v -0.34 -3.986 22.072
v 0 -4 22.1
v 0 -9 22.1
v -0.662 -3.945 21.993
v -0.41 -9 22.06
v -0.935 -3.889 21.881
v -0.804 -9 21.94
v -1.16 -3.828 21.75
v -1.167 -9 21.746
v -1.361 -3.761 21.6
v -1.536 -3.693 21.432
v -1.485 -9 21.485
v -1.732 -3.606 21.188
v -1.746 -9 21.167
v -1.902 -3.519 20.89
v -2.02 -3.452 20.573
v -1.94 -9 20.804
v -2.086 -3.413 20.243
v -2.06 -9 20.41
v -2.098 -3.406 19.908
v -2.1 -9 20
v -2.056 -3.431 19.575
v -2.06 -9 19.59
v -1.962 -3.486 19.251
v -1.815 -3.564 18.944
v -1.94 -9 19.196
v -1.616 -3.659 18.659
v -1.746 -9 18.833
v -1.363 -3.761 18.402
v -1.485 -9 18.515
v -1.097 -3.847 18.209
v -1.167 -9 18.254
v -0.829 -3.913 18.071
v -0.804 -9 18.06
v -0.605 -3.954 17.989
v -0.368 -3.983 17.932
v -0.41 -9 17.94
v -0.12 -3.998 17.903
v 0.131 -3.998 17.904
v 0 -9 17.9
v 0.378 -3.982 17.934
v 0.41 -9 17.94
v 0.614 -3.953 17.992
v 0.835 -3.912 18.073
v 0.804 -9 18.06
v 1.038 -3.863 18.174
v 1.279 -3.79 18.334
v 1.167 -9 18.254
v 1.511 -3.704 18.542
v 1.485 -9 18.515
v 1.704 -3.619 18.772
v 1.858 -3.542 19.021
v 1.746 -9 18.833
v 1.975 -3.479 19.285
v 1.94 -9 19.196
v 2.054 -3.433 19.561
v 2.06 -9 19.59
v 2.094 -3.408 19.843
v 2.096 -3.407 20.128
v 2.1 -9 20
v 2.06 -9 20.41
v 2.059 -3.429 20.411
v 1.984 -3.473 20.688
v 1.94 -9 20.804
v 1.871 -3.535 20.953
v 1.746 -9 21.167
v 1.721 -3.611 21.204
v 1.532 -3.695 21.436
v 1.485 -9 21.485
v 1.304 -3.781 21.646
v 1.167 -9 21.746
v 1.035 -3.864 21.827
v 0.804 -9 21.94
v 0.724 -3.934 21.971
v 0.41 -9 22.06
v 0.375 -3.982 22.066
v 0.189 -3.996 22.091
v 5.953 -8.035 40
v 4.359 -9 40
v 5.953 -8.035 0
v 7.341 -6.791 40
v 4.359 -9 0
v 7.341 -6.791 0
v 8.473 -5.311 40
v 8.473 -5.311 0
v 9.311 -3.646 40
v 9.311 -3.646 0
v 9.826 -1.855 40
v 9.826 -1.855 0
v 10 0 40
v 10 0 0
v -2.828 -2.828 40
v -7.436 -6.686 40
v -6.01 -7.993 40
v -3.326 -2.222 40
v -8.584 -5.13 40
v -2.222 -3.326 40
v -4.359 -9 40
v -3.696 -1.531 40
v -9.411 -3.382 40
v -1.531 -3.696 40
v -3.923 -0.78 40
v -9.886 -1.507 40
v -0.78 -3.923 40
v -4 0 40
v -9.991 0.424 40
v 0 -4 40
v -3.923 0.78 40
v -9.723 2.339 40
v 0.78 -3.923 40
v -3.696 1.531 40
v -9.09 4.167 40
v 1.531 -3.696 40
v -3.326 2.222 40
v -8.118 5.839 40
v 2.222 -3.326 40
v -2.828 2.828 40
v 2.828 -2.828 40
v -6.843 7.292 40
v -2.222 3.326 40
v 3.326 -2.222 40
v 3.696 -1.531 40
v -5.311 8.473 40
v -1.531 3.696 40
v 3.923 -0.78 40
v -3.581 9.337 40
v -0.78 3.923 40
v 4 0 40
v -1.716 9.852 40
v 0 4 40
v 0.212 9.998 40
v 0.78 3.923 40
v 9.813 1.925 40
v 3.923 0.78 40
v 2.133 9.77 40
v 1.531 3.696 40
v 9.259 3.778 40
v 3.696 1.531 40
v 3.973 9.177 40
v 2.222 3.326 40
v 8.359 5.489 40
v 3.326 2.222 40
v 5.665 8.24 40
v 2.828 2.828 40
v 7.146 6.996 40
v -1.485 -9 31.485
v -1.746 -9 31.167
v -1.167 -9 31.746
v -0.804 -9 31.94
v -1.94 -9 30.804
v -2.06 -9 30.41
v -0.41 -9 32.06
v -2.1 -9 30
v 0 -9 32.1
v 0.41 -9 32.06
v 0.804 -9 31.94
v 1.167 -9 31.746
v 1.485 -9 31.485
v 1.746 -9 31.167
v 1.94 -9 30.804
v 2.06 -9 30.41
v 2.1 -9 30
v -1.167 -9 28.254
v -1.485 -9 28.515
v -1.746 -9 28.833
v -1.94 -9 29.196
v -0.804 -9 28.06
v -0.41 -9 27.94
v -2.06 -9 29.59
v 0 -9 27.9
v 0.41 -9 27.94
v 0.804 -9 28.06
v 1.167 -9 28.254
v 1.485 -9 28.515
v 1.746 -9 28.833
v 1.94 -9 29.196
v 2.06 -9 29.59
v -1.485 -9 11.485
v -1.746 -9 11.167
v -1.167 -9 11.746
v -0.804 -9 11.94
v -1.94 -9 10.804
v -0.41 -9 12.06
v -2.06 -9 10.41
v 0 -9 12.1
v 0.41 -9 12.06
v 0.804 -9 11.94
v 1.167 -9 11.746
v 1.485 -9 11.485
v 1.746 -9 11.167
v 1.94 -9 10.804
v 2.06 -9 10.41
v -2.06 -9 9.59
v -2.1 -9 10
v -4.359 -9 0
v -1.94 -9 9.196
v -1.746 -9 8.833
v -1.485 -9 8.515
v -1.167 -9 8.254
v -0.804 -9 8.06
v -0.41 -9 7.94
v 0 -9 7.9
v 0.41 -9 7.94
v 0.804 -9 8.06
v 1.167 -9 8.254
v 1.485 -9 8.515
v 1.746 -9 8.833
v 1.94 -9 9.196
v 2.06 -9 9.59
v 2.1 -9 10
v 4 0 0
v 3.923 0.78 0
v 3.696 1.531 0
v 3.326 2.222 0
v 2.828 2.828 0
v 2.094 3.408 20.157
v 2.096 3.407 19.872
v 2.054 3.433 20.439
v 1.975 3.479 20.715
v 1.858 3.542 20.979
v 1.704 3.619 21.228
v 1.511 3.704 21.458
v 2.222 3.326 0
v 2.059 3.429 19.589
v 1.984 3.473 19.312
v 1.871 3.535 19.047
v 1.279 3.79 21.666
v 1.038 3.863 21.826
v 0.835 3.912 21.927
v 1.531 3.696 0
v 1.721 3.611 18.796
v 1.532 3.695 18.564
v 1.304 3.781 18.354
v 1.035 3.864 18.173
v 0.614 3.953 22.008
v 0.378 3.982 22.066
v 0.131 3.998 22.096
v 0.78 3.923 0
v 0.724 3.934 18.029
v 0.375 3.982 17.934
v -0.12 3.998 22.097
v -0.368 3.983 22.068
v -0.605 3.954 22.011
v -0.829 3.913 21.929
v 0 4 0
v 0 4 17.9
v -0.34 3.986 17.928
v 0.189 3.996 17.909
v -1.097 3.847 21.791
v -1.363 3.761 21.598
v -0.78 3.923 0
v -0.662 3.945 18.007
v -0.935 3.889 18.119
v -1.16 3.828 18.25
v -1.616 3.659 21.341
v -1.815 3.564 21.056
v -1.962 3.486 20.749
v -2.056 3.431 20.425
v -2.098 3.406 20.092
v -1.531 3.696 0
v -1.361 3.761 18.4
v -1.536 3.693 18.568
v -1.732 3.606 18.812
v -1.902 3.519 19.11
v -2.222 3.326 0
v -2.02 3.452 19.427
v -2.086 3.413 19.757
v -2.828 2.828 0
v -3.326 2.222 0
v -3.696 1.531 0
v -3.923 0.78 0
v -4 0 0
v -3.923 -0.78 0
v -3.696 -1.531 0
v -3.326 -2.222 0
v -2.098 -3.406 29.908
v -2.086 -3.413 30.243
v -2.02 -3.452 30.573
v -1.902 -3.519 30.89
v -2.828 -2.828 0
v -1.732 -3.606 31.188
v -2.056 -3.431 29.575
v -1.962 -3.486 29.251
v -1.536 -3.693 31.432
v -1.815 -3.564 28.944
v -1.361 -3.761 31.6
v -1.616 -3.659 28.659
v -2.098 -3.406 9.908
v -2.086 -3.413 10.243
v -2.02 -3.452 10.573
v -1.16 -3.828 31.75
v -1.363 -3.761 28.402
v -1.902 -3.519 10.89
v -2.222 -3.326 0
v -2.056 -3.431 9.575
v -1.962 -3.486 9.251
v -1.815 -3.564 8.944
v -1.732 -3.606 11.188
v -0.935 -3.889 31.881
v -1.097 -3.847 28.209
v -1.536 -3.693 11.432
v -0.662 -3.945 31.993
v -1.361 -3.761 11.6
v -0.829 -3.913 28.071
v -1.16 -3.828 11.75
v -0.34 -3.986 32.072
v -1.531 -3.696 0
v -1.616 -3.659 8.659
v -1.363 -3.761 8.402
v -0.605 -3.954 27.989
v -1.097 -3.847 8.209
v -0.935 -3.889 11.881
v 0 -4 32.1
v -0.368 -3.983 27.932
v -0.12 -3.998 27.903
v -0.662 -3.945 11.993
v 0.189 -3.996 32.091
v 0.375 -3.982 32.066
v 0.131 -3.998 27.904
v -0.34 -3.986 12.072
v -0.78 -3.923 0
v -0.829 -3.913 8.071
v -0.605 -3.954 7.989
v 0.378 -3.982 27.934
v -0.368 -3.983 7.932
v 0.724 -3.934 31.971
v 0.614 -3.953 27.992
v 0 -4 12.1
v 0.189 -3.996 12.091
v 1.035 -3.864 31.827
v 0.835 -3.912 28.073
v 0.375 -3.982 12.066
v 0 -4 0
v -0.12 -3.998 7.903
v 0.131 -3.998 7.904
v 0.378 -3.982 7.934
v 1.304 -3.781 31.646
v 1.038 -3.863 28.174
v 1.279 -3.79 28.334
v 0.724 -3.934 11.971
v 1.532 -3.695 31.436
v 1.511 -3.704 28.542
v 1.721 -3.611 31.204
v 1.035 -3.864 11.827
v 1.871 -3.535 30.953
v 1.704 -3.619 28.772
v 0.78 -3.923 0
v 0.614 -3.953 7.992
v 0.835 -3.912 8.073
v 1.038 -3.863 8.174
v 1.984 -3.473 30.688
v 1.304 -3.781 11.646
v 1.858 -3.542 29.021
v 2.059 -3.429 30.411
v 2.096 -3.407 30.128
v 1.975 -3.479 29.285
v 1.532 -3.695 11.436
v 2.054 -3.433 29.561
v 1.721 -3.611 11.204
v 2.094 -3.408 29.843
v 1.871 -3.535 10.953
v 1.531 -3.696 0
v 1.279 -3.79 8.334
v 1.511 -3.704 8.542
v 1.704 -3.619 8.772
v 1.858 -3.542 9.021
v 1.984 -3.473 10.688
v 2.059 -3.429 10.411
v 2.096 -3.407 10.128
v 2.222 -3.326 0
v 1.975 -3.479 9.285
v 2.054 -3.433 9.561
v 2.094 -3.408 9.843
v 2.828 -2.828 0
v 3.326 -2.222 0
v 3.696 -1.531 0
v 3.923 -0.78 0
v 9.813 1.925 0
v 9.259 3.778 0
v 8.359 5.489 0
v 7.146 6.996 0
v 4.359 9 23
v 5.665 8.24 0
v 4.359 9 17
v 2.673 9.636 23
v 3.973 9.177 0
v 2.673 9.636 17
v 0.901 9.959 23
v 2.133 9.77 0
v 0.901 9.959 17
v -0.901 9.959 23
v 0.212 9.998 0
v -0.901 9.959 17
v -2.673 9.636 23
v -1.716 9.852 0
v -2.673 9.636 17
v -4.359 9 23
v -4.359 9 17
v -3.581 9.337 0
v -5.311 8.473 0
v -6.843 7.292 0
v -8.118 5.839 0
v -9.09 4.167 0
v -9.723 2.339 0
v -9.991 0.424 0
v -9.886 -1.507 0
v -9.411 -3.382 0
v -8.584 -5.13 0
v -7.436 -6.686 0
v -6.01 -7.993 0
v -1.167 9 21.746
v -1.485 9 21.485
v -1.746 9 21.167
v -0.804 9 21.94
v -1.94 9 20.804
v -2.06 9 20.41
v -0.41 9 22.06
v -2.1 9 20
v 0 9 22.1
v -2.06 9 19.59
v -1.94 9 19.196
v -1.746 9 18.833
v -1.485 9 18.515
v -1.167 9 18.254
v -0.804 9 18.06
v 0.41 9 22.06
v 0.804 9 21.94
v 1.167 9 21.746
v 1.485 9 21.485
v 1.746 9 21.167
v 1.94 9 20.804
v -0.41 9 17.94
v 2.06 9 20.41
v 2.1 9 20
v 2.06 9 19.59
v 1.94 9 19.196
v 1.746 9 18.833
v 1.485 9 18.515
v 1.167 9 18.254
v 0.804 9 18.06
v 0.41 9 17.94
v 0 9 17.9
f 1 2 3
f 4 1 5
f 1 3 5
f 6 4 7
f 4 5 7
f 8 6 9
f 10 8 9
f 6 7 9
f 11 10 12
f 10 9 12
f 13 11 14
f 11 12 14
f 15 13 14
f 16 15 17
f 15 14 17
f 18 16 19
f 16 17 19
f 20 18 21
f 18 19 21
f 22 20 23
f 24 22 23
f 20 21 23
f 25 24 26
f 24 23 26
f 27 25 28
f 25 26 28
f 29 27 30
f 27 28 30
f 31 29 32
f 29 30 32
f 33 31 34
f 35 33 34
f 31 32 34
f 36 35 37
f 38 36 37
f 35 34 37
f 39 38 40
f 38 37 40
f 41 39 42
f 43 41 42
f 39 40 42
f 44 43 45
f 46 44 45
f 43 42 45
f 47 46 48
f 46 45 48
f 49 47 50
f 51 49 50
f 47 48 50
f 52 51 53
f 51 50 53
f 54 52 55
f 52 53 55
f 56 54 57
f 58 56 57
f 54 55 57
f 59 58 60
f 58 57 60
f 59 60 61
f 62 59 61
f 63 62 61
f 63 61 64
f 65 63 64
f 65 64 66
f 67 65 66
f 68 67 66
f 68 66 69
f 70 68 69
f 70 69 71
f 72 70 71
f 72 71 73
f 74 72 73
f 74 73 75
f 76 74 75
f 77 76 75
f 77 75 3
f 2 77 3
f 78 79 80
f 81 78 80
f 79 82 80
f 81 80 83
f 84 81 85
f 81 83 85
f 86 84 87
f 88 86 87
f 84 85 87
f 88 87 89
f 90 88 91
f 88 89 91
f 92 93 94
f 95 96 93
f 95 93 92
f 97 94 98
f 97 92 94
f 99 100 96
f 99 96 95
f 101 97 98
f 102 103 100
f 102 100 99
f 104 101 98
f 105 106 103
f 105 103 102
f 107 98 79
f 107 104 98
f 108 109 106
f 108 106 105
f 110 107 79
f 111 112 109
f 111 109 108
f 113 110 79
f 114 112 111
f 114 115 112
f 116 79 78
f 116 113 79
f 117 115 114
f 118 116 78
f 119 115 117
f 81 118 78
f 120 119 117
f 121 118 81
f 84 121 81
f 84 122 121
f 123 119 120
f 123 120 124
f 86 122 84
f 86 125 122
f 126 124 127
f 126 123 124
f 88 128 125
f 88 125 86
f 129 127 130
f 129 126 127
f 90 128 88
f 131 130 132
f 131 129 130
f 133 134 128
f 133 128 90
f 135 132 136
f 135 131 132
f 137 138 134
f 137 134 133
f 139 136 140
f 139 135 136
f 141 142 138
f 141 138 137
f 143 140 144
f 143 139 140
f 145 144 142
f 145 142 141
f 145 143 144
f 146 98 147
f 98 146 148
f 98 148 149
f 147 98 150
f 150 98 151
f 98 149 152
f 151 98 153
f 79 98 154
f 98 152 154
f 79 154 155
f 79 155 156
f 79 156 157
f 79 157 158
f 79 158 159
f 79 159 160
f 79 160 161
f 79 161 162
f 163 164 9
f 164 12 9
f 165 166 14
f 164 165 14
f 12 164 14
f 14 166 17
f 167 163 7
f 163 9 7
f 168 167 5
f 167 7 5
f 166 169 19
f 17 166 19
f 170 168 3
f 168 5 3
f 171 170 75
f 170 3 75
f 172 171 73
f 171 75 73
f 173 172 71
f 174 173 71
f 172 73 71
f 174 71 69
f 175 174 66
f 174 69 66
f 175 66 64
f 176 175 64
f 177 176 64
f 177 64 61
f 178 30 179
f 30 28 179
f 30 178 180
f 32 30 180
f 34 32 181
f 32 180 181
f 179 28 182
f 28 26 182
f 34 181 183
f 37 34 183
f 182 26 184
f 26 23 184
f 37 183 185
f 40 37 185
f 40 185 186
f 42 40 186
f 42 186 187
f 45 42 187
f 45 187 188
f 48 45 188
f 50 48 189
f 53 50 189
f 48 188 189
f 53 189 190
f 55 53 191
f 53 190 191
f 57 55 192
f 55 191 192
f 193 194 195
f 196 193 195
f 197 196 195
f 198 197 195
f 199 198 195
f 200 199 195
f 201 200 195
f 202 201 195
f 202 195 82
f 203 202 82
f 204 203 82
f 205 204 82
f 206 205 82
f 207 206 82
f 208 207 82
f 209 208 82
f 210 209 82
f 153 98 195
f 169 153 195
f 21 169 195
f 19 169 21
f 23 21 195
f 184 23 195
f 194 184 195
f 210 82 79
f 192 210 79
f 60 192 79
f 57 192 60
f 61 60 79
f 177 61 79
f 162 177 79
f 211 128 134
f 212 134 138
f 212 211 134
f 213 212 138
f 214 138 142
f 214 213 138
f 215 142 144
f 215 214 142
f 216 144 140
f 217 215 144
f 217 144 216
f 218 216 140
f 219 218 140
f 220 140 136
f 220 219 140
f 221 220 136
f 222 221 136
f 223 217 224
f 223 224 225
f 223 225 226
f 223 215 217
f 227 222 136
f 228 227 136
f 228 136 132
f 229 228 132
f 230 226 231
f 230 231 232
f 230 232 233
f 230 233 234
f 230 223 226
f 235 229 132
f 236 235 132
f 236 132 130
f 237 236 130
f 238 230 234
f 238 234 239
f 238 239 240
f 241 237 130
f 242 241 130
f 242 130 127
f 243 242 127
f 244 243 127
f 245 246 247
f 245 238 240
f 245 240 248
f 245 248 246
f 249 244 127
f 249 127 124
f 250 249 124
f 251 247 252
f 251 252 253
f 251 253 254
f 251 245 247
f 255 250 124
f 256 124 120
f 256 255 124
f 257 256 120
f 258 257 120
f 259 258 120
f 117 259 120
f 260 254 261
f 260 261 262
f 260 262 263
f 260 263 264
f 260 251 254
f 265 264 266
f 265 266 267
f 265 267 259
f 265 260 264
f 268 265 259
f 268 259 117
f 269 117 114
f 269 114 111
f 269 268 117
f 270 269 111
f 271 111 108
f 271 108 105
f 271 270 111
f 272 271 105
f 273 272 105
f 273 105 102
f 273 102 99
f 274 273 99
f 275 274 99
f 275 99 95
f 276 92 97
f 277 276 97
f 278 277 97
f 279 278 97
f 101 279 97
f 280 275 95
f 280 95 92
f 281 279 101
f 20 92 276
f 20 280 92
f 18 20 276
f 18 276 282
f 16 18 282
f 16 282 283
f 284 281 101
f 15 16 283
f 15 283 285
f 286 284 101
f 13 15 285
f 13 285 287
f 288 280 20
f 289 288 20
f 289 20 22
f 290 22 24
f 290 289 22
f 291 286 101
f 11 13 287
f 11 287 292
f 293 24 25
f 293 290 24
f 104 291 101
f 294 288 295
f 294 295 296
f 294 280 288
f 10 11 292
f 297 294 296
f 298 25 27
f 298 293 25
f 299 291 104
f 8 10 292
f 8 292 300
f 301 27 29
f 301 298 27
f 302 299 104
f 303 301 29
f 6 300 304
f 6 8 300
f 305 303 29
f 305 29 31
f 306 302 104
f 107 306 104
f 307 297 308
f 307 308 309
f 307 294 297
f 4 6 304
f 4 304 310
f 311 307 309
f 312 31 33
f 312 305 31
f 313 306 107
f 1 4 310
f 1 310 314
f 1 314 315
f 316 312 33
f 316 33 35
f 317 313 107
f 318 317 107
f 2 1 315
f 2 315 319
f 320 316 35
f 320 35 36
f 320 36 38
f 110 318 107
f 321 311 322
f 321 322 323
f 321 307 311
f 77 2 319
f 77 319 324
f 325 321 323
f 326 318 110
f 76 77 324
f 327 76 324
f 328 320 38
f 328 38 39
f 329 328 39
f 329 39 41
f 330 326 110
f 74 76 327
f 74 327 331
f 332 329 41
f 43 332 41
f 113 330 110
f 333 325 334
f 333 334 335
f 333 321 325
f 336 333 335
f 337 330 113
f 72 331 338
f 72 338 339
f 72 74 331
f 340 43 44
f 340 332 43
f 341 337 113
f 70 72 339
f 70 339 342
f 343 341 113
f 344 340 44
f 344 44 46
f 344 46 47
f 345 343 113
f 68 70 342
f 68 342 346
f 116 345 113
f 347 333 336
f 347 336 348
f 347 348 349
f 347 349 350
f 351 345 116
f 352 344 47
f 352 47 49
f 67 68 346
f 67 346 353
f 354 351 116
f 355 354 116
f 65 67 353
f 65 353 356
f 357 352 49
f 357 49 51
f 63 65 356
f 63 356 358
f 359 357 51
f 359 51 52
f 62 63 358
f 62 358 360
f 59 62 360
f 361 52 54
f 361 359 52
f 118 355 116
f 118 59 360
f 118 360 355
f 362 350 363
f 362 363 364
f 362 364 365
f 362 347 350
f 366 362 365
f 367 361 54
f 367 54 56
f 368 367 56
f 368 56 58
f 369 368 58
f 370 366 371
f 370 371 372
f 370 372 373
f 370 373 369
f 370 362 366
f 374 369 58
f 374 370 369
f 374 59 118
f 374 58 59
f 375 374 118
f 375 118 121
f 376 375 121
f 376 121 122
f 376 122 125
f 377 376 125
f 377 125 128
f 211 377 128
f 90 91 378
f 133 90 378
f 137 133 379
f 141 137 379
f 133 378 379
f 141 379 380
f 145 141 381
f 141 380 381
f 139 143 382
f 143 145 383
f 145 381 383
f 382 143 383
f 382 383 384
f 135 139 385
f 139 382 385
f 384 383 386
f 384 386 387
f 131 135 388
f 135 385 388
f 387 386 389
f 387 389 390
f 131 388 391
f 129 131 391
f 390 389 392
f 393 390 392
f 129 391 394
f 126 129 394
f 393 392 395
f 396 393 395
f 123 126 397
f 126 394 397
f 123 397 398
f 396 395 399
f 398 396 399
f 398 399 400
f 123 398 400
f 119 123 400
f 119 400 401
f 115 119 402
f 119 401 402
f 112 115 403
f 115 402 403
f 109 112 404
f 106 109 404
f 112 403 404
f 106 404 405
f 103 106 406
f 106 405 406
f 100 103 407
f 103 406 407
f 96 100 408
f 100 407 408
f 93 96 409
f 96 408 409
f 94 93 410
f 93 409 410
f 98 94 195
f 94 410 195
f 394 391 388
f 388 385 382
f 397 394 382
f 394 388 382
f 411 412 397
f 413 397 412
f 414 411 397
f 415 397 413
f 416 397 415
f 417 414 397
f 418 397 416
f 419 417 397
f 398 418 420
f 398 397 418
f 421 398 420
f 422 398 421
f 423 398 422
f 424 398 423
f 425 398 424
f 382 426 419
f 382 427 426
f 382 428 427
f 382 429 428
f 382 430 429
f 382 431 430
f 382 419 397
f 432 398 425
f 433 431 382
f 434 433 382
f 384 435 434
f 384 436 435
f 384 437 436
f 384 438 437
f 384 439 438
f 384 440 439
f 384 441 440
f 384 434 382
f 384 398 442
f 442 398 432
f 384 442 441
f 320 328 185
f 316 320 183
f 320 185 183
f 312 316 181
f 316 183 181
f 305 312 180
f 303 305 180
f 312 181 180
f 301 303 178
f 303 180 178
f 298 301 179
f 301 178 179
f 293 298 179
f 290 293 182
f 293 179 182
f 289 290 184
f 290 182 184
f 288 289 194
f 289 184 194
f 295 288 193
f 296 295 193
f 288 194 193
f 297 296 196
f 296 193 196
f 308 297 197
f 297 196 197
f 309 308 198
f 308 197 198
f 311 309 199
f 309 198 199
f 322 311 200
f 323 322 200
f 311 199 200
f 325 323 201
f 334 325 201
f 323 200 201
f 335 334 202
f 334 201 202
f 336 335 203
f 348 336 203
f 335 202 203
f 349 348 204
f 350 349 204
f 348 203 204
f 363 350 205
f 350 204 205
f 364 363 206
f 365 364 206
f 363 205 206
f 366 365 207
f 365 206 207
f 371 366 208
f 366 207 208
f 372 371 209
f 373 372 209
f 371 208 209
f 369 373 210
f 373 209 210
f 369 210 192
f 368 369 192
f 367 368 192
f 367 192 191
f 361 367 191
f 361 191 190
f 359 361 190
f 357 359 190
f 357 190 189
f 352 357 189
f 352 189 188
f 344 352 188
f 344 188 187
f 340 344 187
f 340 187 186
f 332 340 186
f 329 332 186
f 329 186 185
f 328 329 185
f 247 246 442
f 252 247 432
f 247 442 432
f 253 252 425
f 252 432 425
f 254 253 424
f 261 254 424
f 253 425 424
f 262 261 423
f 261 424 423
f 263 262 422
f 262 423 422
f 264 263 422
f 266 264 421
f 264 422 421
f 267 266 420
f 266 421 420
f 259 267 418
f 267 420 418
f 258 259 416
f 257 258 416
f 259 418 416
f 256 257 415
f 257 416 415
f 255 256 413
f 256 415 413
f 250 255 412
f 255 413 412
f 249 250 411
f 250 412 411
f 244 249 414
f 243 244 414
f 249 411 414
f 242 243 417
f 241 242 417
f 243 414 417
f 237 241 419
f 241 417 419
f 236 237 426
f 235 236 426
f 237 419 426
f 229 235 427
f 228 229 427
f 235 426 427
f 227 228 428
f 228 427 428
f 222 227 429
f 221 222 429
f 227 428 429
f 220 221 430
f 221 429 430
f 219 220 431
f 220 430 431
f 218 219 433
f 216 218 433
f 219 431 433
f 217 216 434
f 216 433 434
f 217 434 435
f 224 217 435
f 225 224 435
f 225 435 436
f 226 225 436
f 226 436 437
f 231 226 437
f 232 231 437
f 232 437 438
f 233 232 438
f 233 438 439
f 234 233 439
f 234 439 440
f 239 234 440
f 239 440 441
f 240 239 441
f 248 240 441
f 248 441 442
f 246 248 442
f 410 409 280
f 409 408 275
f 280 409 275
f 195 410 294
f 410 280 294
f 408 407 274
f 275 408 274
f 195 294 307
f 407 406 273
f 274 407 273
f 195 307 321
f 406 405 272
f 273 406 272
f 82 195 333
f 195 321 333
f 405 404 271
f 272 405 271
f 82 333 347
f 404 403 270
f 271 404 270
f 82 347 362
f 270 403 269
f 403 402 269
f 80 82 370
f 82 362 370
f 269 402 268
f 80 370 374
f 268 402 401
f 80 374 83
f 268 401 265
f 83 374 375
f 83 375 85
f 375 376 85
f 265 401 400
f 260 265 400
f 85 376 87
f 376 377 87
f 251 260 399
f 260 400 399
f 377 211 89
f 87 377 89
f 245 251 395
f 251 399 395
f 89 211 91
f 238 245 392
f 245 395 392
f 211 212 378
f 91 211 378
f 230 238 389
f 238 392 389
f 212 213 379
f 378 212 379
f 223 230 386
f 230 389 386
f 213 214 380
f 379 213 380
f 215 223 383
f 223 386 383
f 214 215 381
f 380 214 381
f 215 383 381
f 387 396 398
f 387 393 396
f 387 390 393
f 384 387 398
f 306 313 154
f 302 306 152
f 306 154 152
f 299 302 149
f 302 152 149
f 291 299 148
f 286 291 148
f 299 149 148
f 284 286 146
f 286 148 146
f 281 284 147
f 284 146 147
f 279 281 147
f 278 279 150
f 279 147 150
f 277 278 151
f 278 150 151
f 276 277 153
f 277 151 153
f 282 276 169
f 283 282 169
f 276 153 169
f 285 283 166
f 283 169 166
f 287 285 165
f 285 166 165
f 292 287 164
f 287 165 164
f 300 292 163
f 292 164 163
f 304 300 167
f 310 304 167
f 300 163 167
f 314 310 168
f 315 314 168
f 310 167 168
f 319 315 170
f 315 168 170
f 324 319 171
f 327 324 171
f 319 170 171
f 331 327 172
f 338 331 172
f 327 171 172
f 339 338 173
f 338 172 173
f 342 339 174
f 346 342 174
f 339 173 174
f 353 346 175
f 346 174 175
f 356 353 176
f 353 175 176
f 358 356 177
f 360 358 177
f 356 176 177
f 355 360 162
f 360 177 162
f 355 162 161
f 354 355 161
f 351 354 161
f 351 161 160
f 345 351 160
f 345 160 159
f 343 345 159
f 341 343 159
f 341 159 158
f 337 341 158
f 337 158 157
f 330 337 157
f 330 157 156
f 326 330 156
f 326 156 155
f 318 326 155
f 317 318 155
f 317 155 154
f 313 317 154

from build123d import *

# Parameters (mm, degrees)
SKETCH1_R                           = 10
SKETCH1_R_2                         = 4
BOSS_EXTRUDE1_DEPTH                 = 40
SKETCH4_W                           = 2.1
SKETCH4_H                           = 10
CUT_EXTRUDE1_START                  = 10
SKETCH5_W                           = 20
SKETCH5_H                           = 6
CUT_EXTRUDE1_DEPTH                  = 1
SKETCH7_W                           = 2.1
SKETCH7_H                           = 10
F_4_2_4_2_DIAMETER_HOLE1_AT_2_COUNT = 2
F_4_2_4_2_DIAMETER_HOLE1_AT_2_PITCH = 10
F_4_2_4_2_DIAMETER_HOLE1_AT_3_COUNT = 2
F_4_2_4_2_DIAMETER_HOLE1_AT_3_PITCH = 20
CUT_EXTRUDE3_START                  = -10
SKETCH8_W                           = 20
SKETCH8_H                           = 40
CUT_EXTRUDE3_DEPTH                  = 1


with BuildPart() as part:
    # Sketch1 → Boss-Extrude1 (new body)
    with BuildSketch(Plane.XY):
        Circle(SKETCH1_R)
        Circle(SKETCH1_R_2, mode=Mode.SUBTRACT)
    extrude(amount=BOSS_EXTRUDE1_DEPTH)

    # Sketch4 → Ø4.2 (4.2) Diameter Hole2 (revolve, cut)
    with BuildSketch(Plane(origin=(0, 0, 20), x_dir=(0, 0, -1), z_dir=(1, 0, 0))):
        with Locations((1.05, 5)):
            Rectangle(SKETCH4_W, SKETCH4_H)
    revolve(axis=Axis((0, -6.35, 20), (0, 1, 0)), mode=Mode.SUBTRACT)

    # Sketch5 → Cut-Extrude1 (cut)
    with BuildSketch(Plane(origin=(0, 0, 0), x_dir=(1, 0, 0), z_dir=(0, 1, 0)).offset(CUT_EXTRUDE1_START)):
        with Locations((0, -20)):
            Rectangle(SKETCH5_W, SKETCH5_H)
    extrude(amount=-CUT_EXTRUDE1_DEPTH, mode=Mode.SUBTRACT)

    # Sketch7 → Ø4.2 (4.2) Diameter Hole1 (revolve, cut)
    with BuildSketch(Plane(origin=(0, 0, 30), x_dir=(0, 0, 1), z_dir=(1, 0, 0))):
        with Locations((1.05, 5)):
            Rectangle(SKETCH7_W, SKETCH7_H)
    f_4_2_4_2_diameter_hole1 = revolve(axis=Axis((0, 6.35, 30), (0, -1, 0)), mode=Mode.SUBTRACT)

    # Ø4.2 (4.2) Diameter Hole1 at 2: Ø4.2 (4.2) Diameter Hole1 ×2
    with Locations(*[(0, 0, -i * F_4_2_4_2_DIAMETER_HOLE1_AT_2_PITCH) for i in range(1, F_4_2_4_2_DIAMETER_HOLE1_AT_2_COUNT)]):
        add(f_4_2_4_2_diameter_hole1, mode=Mode.SUBTRACT)

    # Ø4.2 (4.2) Diameter Hole1 at 3: Ø4.2 (4.2) Diameter Hole1 ×2
    with Locations(*[(0, 0, -i * F_4_2_4_2_DIAMETER_HOLE1_AT_3_PITCH) for i in range(1, F_4_2_4_2_DIAMETER_HOLE1_AT_3_COUNT)]):
        add(f_4_2_4_2_diameter_hole1, mode=Mode.SUBTRACT)

    # Sketch8 → Cut-Extrude3 (cut)
    with BuildSketch(Plane(origin=(0, 0, 0), x_dir=(1, 0, 0), z_dir=(0, 1, 0)).offset(CUT_EXTRUDE3_START)):
        with Locations((0, -20)):
            Rectangle(SKETCH8_W, SKETCH8_H)
    extrude(amount=CUT_EXTRUDE3_DEPTH, mode=Mode.SUBTRACT)


solid = part.part
